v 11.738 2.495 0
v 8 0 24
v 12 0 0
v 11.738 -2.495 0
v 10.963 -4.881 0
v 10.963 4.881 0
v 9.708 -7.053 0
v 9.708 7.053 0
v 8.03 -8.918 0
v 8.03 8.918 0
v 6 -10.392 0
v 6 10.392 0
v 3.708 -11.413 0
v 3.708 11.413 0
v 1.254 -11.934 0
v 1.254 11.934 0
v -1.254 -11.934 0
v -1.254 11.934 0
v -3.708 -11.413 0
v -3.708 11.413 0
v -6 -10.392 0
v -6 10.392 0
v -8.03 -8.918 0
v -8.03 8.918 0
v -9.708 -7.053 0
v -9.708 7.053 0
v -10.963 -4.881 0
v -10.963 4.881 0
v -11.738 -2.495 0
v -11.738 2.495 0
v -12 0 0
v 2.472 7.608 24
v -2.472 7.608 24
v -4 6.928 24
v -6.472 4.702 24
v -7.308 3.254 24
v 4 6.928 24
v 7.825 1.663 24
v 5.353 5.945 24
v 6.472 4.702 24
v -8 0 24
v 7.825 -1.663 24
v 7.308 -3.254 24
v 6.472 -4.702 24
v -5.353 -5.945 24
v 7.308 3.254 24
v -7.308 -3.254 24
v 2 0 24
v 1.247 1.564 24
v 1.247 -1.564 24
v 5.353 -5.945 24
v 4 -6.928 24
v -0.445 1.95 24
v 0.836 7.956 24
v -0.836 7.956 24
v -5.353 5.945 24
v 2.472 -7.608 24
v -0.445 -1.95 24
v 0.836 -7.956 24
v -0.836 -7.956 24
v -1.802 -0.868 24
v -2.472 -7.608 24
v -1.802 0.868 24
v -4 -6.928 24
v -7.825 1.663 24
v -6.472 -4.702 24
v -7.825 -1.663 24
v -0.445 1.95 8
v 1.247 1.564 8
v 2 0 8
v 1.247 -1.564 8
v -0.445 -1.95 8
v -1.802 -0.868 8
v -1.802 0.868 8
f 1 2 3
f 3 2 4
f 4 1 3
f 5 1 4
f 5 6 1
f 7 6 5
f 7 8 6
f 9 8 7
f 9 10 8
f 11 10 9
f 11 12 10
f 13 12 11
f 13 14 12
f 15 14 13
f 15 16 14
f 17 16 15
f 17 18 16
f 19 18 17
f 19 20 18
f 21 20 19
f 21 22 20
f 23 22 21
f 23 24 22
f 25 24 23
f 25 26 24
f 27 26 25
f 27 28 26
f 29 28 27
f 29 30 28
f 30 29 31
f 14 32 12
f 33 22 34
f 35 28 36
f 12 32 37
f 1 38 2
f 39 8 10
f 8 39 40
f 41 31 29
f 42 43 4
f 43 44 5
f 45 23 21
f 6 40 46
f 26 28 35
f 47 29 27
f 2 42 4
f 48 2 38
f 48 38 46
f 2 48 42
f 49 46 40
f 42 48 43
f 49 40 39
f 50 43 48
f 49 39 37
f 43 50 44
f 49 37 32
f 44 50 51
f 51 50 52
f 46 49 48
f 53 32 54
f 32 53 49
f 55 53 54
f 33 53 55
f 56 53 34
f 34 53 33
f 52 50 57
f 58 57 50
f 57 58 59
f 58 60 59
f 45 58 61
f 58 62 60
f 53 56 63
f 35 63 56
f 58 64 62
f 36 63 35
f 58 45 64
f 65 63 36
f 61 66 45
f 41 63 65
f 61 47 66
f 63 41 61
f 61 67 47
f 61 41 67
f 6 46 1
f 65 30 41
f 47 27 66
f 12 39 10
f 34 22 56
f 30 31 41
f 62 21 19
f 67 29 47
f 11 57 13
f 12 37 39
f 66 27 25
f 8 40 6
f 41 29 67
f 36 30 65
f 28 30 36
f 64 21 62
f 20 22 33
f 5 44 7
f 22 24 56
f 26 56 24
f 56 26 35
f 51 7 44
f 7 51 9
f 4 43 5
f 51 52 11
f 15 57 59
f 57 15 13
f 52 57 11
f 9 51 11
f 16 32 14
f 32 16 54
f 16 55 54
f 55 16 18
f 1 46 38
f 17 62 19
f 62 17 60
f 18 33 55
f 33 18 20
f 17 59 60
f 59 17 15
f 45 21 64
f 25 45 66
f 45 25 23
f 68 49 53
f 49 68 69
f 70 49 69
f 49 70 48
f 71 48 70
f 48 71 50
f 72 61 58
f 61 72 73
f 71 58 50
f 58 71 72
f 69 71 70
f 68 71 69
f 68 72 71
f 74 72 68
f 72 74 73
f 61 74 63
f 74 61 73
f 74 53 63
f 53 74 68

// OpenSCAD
outerRadius = 12;
holeRadius = 2;
height = 24;
offset = 4;

difference() {
    cylinder(height, outerRadius, (outerRadius - offset), false);
    translate([0, 0, (offset * 2)]) 
        cylinder((height - offset), holeRadius, holeRadius, false);
}
